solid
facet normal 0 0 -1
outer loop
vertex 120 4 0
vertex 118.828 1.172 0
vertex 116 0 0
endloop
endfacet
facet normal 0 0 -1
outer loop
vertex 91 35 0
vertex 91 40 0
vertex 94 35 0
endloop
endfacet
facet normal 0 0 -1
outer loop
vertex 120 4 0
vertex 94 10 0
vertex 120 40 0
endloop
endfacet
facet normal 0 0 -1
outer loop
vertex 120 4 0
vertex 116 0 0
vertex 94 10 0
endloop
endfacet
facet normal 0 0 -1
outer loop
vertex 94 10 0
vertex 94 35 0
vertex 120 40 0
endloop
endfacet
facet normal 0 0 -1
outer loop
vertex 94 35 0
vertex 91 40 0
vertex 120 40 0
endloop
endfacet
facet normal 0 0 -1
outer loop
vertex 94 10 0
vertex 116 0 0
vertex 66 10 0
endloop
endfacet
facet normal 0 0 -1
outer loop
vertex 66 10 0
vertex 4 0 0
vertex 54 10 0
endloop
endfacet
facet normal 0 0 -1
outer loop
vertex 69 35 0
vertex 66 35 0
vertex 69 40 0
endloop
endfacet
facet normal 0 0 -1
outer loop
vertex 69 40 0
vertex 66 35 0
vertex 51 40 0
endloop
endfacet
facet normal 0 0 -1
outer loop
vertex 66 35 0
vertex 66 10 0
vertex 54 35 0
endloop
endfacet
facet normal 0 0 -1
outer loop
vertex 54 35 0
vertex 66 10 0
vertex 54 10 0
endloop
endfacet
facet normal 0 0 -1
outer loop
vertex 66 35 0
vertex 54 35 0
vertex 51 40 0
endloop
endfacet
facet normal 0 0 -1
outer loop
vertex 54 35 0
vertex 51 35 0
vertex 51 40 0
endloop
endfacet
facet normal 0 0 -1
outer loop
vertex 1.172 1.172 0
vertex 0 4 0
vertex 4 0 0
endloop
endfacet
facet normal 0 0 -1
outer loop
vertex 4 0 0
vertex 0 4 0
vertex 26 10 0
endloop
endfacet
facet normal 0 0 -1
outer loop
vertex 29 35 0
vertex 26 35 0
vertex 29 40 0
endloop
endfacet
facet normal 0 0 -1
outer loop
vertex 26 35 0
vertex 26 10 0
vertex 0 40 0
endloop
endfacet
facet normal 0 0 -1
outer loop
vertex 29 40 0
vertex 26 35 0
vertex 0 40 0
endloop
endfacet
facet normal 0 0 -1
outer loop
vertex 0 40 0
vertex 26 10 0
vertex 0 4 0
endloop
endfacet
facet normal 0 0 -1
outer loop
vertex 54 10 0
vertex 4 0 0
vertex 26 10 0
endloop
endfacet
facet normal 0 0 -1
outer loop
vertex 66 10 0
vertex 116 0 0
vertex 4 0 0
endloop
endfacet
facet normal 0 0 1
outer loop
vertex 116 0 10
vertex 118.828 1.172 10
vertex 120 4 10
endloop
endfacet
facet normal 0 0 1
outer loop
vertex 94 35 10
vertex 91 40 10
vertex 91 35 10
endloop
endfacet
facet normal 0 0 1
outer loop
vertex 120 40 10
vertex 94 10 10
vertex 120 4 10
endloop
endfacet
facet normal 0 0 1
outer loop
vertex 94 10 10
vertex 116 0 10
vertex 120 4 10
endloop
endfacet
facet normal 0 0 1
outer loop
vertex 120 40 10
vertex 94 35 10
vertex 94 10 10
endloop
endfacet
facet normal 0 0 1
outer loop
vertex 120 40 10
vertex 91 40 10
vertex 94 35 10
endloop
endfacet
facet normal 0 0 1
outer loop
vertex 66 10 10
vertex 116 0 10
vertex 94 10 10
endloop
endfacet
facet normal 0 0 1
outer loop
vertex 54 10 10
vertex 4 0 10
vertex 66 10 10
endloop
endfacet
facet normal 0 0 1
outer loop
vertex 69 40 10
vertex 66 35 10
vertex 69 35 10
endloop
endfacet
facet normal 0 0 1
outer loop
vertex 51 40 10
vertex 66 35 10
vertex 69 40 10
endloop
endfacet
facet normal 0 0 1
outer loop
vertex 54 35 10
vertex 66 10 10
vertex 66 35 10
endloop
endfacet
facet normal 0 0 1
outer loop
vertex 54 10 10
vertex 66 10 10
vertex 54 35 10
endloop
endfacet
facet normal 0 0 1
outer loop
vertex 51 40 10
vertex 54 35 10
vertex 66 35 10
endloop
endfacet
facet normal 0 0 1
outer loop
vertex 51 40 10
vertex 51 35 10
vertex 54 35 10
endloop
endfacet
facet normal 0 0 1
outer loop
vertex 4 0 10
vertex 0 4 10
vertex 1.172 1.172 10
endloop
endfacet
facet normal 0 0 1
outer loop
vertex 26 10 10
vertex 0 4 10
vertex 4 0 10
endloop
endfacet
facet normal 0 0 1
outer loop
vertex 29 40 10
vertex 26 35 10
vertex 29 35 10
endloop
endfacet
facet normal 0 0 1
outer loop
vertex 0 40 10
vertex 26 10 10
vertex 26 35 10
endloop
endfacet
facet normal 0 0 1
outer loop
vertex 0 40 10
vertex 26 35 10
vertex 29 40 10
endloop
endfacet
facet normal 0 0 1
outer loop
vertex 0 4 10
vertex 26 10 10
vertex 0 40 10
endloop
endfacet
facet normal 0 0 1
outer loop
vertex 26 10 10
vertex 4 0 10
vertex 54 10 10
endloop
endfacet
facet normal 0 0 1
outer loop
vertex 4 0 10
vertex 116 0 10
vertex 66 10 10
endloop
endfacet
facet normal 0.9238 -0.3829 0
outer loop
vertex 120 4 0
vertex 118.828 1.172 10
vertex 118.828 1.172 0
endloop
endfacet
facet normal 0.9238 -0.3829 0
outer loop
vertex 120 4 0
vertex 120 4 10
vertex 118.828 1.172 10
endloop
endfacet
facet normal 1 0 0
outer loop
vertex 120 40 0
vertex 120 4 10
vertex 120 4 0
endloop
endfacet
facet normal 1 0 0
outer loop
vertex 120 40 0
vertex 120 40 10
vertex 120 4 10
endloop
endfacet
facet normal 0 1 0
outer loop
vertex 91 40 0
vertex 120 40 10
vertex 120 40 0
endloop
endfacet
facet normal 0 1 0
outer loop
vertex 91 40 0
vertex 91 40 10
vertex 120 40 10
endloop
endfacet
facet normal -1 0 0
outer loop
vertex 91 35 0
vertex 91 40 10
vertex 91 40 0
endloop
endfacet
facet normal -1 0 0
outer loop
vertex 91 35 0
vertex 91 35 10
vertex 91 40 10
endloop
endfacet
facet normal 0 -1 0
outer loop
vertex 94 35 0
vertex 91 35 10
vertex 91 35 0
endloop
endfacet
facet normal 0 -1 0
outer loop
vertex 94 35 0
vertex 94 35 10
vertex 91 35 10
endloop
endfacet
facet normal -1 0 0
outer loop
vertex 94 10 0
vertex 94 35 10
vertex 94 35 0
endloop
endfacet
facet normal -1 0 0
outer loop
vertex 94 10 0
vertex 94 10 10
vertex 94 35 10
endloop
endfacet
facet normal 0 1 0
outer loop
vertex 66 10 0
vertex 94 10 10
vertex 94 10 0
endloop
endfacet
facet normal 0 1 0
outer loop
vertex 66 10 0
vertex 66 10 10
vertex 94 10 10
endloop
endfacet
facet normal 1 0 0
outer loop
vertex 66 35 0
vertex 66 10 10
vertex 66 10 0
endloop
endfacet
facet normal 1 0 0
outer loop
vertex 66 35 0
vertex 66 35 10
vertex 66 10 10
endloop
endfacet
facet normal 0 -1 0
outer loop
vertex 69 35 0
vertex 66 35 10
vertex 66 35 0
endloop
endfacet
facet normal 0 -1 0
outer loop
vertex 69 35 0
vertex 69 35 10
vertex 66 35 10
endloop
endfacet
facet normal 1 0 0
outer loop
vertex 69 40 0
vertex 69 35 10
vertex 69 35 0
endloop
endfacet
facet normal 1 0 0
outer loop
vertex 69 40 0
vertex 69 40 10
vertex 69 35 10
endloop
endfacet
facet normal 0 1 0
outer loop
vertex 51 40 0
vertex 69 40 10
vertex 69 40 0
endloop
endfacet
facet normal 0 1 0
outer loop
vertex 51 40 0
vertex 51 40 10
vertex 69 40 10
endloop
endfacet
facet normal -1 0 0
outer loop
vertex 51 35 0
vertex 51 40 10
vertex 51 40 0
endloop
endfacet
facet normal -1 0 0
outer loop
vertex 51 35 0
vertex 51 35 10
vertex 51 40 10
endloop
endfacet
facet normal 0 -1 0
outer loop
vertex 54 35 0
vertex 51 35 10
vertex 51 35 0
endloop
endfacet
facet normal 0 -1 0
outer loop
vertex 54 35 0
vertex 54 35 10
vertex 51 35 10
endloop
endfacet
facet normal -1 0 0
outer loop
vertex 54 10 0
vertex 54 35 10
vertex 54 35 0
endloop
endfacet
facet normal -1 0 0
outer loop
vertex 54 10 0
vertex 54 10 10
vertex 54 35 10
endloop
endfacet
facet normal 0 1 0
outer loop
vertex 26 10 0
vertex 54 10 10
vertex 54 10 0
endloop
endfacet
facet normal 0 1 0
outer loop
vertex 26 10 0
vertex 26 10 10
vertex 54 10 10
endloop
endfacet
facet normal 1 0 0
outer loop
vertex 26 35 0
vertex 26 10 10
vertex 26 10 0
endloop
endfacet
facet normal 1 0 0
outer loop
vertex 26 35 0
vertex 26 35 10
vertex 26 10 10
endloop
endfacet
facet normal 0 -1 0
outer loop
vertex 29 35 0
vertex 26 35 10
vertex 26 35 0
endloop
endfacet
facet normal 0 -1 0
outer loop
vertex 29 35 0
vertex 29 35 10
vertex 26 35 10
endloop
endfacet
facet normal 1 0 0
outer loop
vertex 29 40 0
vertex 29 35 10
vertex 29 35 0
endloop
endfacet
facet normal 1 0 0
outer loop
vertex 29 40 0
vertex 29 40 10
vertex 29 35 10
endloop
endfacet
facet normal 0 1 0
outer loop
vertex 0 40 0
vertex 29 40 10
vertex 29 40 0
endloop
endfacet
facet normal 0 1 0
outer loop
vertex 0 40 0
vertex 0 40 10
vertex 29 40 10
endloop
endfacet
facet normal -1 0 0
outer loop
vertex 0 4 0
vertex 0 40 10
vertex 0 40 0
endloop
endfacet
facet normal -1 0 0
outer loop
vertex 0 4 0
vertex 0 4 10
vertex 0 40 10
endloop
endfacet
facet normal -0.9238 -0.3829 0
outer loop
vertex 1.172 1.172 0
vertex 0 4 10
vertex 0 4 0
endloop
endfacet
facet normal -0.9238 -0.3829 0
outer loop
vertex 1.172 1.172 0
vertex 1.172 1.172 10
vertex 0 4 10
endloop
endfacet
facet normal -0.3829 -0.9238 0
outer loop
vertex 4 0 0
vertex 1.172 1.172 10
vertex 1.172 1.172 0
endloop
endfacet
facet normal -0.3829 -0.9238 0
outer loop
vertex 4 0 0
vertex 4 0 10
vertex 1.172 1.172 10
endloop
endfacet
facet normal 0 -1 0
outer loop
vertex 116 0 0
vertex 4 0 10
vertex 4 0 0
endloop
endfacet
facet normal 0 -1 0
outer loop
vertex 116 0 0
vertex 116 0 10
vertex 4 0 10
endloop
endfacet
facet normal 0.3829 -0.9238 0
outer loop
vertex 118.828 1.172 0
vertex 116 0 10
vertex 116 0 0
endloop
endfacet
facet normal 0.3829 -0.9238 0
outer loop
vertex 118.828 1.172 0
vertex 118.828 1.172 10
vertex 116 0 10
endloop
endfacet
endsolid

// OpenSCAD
$fn = 32;

// ----------------------------------------------------------------------
// Oversize slot bar: 120 mm bar with 2 oversize windows
// ----------------------------------------------------------------------

// --- parameters (mm) ---
profile_height = 10;      // extrusion height
profile_points = 24;      // points of the closed outline

profile = [[0, 4], [1.172, 1.172], [4, 0], [116, 0], [118.828, 1.172], [120, 4], [120, 40], [91, 40], [91, 35], [94, 35], [94, 10], [66, 10], [66, 35], [69, 35], [69, 40], [51, 40], [51, 35], [54, 35], [54, 10], [26, 10], [26, 35], [29, 35], [29, 40], [0, 40]];  // single closed polygon, 24 points, counter clockwise

// --- the one profile operation ---
linear_extrude(height = profile_height) polygon(points = profile);
